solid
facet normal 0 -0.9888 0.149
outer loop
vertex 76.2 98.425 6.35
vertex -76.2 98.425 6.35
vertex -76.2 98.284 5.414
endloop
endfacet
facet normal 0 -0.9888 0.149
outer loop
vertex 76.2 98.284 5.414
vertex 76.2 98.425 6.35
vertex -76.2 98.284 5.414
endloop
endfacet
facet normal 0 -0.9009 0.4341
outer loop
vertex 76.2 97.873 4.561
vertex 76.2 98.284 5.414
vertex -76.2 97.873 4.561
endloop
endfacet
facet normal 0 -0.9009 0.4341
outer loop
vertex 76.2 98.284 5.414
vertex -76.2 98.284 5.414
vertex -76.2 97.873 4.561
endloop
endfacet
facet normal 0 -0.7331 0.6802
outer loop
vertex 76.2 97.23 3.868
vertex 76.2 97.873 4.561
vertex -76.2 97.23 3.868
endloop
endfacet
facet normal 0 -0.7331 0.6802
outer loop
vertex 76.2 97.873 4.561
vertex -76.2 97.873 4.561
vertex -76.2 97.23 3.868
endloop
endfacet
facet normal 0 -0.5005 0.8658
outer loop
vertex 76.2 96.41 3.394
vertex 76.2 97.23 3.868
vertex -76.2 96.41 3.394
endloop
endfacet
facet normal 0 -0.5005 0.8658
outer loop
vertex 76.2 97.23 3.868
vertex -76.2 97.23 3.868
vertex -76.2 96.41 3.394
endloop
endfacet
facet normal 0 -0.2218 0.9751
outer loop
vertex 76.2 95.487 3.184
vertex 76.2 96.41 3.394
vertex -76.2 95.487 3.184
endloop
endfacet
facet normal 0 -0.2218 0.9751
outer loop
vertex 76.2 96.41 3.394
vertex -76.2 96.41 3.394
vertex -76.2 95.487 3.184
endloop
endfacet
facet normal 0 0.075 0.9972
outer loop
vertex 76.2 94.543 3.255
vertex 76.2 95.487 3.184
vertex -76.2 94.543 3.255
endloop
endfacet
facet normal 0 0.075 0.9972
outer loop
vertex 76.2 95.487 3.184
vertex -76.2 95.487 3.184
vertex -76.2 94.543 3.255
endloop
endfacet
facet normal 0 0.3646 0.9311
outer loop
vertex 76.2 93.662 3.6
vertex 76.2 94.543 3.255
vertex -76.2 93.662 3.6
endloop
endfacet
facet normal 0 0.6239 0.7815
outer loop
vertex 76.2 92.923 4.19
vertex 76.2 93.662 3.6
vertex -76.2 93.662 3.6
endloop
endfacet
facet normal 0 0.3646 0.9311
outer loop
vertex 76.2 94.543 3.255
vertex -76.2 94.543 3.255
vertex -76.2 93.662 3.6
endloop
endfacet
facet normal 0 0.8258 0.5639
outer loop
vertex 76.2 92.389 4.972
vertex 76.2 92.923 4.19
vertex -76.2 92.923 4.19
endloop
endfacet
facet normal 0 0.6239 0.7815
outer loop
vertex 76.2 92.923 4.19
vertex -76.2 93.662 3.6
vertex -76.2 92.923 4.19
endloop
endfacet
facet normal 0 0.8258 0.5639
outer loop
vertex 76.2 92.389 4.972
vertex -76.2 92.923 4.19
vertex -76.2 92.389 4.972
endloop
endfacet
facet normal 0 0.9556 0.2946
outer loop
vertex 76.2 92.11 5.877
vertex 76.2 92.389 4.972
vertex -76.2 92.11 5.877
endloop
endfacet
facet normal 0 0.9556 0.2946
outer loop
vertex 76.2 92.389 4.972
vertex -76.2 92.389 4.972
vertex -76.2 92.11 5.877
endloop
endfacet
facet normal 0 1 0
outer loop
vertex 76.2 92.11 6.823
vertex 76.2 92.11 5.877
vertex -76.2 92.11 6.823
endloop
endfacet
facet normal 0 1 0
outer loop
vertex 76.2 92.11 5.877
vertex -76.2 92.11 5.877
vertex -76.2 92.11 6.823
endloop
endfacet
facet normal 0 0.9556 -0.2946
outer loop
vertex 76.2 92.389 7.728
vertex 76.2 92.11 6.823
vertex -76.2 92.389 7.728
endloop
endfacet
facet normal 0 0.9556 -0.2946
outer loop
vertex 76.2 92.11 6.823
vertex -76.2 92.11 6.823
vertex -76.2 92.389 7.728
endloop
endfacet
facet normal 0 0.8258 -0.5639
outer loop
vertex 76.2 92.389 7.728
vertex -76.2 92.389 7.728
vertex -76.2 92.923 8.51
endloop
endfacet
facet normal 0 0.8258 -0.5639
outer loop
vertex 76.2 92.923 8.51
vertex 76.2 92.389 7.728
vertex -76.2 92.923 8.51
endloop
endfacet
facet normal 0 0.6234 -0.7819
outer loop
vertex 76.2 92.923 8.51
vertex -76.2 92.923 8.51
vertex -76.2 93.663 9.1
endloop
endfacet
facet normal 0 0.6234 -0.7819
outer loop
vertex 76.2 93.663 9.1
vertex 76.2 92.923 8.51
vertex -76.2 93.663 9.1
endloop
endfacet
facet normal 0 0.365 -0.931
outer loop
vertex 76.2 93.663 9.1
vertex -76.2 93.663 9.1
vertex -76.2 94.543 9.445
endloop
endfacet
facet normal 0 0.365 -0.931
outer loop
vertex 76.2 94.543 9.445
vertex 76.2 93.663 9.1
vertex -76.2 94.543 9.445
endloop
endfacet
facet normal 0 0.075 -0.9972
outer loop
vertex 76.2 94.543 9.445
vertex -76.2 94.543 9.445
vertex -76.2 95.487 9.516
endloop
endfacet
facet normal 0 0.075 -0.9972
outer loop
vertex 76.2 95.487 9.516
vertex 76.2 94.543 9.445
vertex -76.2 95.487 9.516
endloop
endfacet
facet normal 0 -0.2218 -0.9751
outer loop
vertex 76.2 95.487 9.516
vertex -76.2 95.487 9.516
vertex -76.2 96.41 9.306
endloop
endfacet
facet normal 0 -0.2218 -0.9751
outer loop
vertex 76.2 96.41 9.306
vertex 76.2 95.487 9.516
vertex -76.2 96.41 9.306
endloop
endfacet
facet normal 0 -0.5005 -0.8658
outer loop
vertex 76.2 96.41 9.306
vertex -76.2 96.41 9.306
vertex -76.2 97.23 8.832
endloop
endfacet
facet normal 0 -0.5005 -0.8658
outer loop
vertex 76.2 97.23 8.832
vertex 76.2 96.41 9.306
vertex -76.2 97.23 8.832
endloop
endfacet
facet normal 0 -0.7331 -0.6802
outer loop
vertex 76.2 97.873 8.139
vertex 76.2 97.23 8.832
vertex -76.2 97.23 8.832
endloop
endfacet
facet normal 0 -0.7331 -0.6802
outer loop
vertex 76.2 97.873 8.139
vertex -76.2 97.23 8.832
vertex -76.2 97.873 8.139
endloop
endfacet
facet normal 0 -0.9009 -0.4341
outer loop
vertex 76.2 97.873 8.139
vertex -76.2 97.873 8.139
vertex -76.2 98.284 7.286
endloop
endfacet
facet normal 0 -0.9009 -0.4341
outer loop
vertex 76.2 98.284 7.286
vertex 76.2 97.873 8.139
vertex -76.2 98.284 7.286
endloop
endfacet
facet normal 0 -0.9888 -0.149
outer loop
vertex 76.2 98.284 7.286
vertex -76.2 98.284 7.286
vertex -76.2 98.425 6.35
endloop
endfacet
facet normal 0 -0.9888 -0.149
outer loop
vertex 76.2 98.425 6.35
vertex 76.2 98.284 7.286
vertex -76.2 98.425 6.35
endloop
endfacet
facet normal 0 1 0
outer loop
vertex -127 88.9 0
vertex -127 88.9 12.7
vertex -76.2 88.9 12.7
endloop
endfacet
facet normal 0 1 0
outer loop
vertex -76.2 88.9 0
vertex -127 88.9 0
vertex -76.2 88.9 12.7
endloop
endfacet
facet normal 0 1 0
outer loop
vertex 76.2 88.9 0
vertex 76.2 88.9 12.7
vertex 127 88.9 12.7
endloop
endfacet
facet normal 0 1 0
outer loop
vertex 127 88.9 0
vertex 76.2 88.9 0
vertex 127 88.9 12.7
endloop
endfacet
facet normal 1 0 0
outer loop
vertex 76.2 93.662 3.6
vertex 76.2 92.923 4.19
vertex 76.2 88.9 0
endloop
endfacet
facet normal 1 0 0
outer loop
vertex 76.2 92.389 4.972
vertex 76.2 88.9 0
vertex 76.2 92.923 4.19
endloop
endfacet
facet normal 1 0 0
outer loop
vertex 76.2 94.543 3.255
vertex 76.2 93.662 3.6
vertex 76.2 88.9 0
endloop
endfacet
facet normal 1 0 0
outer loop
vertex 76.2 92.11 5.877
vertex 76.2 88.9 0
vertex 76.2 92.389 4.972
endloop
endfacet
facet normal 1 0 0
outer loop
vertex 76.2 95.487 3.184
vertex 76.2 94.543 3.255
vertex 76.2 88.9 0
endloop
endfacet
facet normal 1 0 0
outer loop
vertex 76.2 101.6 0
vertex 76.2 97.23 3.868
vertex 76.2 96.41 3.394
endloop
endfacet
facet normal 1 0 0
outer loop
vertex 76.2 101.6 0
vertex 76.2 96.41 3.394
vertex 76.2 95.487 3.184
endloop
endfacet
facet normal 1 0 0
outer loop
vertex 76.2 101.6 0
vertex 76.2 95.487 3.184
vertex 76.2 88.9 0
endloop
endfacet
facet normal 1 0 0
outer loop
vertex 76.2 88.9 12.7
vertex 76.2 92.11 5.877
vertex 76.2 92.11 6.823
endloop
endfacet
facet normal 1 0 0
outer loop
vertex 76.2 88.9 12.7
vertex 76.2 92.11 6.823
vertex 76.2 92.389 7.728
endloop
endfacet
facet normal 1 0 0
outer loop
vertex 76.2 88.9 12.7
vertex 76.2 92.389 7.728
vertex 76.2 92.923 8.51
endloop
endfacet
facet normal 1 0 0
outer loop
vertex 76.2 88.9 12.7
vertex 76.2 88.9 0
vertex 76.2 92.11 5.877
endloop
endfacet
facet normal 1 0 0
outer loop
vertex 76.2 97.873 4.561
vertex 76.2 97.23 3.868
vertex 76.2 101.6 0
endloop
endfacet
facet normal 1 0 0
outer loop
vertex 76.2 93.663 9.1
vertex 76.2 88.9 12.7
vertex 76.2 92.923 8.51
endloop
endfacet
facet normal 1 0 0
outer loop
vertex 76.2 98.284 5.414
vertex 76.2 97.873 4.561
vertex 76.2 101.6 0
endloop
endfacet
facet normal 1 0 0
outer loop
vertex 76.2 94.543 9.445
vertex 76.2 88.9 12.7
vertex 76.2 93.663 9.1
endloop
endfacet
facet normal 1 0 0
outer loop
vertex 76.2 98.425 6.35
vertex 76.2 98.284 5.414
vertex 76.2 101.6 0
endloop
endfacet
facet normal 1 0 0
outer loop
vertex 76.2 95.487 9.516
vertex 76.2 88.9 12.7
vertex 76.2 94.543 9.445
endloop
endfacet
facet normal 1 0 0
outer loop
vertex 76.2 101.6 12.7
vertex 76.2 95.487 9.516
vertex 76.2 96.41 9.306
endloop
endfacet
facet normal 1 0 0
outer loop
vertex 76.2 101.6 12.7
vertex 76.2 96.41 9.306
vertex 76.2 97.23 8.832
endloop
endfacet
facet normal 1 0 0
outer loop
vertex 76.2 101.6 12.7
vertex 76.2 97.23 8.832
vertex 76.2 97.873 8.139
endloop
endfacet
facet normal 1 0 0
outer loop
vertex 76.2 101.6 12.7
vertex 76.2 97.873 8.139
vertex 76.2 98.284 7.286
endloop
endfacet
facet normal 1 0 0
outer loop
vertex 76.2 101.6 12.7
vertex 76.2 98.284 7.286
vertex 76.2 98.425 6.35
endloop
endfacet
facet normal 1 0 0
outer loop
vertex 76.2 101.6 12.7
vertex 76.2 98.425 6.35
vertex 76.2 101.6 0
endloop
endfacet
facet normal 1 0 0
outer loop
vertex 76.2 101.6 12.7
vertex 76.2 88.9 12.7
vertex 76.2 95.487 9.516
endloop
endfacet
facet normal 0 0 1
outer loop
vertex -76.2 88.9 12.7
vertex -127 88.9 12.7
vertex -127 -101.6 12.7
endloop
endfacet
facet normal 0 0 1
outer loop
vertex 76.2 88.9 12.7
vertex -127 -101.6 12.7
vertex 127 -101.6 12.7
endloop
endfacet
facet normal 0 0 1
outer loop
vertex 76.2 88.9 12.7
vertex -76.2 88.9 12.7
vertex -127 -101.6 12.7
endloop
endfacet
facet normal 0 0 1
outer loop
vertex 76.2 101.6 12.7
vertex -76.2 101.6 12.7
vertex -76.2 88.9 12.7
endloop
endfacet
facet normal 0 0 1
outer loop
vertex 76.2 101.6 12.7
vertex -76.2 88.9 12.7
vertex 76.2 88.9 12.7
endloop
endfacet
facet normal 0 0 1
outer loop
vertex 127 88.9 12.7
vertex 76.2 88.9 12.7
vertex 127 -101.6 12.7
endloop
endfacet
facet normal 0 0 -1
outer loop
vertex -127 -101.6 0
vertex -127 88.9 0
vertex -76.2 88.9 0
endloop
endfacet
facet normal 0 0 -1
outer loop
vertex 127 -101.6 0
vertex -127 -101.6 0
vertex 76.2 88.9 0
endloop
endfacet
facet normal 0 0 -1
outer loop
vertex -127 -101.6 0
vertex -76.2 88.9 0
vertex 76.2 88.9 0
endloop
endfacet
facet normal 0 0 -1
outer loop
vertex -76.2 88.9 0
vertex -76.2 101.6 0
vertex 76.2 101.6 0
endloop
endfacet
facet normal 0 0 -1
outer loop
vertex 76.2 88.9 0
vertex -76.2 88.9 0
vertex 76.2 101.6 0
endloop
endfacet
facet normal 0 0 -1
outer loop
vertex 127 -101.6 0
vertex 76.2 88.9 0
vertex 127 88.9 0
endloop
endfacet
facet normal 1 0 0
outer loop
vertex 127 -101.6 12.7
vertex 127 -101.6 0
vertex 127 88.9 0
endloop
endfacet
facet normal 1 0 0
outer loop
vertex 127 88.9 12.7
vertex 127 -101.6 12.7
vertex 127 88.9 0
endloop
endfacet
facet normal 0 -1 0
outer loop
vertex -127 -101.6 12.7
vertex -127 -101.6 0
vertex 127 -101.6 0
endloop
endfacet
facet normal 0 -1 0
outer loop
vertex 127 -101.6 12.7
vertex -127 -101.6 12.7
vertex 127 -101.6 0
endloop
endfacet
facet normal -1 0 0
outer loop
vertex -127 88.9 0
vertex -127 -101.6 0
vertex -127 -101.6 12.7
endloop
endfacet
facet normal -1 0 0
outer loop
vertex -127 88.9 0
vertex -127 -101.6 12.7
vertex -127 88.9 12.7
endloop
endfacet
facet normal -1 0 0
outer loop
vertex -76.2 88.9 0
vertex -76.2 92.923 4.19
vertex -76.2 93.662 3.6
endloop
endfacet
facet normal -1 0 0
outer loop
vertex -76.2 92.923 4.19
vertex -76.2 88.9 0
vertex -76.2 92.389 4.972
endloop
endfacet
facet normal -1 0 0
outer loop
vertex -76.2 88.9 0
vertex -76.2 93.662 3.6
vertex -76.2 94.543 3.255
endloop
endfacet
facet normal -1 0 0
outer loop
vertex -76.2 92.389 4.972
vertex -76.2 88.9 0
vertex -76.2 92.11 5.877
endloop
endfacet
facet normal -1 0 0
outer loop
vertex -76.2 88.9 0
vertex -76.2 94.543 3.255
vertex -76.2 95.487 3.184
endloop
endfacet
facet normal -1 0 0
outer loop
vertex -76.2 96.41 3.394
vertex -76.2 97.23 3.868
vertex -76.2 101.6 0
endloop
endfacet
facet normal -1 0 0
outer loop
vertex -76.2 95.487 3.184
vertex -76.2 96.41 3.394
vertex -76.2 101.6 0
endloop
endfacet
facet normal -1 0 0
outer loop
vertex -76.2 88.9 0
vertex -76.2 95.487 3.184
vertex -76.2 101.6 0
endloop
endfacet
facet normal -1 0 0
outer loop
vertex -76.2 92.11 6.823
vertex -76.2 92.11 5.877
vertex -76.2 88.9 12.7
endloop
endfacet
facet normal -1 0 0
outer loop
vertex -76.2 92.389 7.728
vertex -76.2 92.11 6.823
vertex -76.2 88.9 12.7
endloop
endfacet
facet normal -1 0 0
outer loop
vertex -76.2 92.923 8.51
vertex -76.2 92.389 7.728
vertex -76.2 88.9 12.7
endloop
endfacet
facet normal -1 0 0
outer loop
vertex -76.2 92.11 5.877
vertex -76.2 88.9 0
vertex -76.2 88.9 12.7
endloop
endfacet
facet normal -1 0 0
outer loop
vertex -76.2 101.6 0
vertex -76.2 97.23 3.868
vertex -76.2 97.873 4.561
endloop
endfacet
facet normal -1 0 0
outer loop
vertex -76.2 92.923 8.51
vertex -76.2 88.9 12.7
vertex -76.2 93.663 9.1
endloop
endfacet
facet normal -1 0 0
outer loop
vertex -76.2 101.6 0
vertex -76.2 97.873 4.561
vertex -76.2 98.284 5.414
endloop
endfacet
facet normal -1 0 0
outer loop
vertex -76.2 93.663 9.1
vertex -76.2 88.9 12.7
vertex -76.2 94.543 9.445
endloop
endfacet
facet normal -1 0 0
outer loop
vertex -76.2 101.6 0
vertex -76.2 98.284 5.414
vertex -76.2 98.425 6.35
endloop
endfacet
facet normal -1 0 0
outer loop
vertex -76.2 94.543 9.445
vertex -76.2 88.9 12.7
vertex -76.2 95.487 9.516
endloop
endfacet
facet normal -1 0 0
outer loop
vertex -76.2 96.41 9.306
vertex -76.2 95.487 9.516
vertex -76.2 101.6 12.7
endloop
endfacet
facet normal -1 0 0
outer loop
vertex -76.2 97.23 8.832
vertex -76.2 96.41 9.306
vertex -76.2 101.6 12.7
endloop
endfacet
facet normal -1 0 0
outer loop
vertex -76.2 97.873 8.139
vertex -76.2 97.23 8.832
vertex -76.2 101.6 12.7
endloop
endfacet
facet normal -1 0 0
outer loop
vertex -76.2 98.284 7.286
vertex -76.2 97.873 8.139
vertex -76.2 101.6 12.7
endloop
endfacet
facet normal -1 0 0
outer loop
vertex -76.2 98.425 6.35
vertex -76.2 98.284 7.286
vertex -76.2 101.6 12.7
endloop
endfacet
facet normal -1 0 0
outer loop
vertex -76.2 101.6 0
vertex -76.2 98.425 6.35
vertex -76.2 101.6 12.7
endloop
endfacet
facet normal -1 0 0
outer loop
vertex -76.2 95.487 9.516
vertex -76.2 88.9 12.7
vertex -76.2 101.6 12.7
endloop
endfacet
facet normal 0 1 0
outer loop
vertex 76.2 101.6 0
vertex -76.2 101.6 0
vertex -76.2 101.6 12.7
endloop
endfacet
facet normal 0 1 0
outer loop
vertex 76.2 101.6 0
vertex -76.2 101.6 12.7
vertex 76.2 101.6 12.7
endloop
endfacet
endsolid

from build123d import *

# Parameters (mm, degrees)
F0_W     = 254
F0_H     = 203.2
F1_DEPTH = 12.7
F4_DEPTH = 254.001
F2_W     = 50.8
F2_H     = 12.7
F5_DEPTH = 12.701


with BuildPart() as f1:
    # F0 (on Top) → F1 (new body)
    with BuildSketch(Plane.XY):
        Rectangle(F0_W, F0_H)
    extrude(amount=F1_DEPTH)

    # F3 (on face) → F4 (cut, through all)
    with BuildSketch(Plane(origin=(-127, 0, 0), x_dir=(0, -1, 0), z_dir=(-1, 0, 0))):
        with BuildLine():
            ThreePointArc((-92.075, 6.35), (-95.25, 9.525), (-98.425, 6.35))
            Line((-98.425, 6.35), (-92.075, 6.35))
        make_face()
        with BuildLine():
            Line((-92.075, 6.35), (-98.425, 6.35))
            ThreePointArc((-98.425, 6.35), (-95.25, 3.175), (-92.075, 6.35))
        make_face()
    extrude(amount=-F4_DEPTH, mode=Mode.SUBTRACT)

    # F2 (on face) → F5 (cut, through all)
    with BuildSketch(Plane.XY.offset(12.7)):
        with Locations((-101.6, 95.25)):
            Rectangle(F2_W, F2_H)
        with Locations((101.6, 95.25)):
            Rectangle(F2_W, F2_H)
    extrude(amount=-F5_DEPTH, mode=Mode.SUBTRACT)


solid = f1.part
